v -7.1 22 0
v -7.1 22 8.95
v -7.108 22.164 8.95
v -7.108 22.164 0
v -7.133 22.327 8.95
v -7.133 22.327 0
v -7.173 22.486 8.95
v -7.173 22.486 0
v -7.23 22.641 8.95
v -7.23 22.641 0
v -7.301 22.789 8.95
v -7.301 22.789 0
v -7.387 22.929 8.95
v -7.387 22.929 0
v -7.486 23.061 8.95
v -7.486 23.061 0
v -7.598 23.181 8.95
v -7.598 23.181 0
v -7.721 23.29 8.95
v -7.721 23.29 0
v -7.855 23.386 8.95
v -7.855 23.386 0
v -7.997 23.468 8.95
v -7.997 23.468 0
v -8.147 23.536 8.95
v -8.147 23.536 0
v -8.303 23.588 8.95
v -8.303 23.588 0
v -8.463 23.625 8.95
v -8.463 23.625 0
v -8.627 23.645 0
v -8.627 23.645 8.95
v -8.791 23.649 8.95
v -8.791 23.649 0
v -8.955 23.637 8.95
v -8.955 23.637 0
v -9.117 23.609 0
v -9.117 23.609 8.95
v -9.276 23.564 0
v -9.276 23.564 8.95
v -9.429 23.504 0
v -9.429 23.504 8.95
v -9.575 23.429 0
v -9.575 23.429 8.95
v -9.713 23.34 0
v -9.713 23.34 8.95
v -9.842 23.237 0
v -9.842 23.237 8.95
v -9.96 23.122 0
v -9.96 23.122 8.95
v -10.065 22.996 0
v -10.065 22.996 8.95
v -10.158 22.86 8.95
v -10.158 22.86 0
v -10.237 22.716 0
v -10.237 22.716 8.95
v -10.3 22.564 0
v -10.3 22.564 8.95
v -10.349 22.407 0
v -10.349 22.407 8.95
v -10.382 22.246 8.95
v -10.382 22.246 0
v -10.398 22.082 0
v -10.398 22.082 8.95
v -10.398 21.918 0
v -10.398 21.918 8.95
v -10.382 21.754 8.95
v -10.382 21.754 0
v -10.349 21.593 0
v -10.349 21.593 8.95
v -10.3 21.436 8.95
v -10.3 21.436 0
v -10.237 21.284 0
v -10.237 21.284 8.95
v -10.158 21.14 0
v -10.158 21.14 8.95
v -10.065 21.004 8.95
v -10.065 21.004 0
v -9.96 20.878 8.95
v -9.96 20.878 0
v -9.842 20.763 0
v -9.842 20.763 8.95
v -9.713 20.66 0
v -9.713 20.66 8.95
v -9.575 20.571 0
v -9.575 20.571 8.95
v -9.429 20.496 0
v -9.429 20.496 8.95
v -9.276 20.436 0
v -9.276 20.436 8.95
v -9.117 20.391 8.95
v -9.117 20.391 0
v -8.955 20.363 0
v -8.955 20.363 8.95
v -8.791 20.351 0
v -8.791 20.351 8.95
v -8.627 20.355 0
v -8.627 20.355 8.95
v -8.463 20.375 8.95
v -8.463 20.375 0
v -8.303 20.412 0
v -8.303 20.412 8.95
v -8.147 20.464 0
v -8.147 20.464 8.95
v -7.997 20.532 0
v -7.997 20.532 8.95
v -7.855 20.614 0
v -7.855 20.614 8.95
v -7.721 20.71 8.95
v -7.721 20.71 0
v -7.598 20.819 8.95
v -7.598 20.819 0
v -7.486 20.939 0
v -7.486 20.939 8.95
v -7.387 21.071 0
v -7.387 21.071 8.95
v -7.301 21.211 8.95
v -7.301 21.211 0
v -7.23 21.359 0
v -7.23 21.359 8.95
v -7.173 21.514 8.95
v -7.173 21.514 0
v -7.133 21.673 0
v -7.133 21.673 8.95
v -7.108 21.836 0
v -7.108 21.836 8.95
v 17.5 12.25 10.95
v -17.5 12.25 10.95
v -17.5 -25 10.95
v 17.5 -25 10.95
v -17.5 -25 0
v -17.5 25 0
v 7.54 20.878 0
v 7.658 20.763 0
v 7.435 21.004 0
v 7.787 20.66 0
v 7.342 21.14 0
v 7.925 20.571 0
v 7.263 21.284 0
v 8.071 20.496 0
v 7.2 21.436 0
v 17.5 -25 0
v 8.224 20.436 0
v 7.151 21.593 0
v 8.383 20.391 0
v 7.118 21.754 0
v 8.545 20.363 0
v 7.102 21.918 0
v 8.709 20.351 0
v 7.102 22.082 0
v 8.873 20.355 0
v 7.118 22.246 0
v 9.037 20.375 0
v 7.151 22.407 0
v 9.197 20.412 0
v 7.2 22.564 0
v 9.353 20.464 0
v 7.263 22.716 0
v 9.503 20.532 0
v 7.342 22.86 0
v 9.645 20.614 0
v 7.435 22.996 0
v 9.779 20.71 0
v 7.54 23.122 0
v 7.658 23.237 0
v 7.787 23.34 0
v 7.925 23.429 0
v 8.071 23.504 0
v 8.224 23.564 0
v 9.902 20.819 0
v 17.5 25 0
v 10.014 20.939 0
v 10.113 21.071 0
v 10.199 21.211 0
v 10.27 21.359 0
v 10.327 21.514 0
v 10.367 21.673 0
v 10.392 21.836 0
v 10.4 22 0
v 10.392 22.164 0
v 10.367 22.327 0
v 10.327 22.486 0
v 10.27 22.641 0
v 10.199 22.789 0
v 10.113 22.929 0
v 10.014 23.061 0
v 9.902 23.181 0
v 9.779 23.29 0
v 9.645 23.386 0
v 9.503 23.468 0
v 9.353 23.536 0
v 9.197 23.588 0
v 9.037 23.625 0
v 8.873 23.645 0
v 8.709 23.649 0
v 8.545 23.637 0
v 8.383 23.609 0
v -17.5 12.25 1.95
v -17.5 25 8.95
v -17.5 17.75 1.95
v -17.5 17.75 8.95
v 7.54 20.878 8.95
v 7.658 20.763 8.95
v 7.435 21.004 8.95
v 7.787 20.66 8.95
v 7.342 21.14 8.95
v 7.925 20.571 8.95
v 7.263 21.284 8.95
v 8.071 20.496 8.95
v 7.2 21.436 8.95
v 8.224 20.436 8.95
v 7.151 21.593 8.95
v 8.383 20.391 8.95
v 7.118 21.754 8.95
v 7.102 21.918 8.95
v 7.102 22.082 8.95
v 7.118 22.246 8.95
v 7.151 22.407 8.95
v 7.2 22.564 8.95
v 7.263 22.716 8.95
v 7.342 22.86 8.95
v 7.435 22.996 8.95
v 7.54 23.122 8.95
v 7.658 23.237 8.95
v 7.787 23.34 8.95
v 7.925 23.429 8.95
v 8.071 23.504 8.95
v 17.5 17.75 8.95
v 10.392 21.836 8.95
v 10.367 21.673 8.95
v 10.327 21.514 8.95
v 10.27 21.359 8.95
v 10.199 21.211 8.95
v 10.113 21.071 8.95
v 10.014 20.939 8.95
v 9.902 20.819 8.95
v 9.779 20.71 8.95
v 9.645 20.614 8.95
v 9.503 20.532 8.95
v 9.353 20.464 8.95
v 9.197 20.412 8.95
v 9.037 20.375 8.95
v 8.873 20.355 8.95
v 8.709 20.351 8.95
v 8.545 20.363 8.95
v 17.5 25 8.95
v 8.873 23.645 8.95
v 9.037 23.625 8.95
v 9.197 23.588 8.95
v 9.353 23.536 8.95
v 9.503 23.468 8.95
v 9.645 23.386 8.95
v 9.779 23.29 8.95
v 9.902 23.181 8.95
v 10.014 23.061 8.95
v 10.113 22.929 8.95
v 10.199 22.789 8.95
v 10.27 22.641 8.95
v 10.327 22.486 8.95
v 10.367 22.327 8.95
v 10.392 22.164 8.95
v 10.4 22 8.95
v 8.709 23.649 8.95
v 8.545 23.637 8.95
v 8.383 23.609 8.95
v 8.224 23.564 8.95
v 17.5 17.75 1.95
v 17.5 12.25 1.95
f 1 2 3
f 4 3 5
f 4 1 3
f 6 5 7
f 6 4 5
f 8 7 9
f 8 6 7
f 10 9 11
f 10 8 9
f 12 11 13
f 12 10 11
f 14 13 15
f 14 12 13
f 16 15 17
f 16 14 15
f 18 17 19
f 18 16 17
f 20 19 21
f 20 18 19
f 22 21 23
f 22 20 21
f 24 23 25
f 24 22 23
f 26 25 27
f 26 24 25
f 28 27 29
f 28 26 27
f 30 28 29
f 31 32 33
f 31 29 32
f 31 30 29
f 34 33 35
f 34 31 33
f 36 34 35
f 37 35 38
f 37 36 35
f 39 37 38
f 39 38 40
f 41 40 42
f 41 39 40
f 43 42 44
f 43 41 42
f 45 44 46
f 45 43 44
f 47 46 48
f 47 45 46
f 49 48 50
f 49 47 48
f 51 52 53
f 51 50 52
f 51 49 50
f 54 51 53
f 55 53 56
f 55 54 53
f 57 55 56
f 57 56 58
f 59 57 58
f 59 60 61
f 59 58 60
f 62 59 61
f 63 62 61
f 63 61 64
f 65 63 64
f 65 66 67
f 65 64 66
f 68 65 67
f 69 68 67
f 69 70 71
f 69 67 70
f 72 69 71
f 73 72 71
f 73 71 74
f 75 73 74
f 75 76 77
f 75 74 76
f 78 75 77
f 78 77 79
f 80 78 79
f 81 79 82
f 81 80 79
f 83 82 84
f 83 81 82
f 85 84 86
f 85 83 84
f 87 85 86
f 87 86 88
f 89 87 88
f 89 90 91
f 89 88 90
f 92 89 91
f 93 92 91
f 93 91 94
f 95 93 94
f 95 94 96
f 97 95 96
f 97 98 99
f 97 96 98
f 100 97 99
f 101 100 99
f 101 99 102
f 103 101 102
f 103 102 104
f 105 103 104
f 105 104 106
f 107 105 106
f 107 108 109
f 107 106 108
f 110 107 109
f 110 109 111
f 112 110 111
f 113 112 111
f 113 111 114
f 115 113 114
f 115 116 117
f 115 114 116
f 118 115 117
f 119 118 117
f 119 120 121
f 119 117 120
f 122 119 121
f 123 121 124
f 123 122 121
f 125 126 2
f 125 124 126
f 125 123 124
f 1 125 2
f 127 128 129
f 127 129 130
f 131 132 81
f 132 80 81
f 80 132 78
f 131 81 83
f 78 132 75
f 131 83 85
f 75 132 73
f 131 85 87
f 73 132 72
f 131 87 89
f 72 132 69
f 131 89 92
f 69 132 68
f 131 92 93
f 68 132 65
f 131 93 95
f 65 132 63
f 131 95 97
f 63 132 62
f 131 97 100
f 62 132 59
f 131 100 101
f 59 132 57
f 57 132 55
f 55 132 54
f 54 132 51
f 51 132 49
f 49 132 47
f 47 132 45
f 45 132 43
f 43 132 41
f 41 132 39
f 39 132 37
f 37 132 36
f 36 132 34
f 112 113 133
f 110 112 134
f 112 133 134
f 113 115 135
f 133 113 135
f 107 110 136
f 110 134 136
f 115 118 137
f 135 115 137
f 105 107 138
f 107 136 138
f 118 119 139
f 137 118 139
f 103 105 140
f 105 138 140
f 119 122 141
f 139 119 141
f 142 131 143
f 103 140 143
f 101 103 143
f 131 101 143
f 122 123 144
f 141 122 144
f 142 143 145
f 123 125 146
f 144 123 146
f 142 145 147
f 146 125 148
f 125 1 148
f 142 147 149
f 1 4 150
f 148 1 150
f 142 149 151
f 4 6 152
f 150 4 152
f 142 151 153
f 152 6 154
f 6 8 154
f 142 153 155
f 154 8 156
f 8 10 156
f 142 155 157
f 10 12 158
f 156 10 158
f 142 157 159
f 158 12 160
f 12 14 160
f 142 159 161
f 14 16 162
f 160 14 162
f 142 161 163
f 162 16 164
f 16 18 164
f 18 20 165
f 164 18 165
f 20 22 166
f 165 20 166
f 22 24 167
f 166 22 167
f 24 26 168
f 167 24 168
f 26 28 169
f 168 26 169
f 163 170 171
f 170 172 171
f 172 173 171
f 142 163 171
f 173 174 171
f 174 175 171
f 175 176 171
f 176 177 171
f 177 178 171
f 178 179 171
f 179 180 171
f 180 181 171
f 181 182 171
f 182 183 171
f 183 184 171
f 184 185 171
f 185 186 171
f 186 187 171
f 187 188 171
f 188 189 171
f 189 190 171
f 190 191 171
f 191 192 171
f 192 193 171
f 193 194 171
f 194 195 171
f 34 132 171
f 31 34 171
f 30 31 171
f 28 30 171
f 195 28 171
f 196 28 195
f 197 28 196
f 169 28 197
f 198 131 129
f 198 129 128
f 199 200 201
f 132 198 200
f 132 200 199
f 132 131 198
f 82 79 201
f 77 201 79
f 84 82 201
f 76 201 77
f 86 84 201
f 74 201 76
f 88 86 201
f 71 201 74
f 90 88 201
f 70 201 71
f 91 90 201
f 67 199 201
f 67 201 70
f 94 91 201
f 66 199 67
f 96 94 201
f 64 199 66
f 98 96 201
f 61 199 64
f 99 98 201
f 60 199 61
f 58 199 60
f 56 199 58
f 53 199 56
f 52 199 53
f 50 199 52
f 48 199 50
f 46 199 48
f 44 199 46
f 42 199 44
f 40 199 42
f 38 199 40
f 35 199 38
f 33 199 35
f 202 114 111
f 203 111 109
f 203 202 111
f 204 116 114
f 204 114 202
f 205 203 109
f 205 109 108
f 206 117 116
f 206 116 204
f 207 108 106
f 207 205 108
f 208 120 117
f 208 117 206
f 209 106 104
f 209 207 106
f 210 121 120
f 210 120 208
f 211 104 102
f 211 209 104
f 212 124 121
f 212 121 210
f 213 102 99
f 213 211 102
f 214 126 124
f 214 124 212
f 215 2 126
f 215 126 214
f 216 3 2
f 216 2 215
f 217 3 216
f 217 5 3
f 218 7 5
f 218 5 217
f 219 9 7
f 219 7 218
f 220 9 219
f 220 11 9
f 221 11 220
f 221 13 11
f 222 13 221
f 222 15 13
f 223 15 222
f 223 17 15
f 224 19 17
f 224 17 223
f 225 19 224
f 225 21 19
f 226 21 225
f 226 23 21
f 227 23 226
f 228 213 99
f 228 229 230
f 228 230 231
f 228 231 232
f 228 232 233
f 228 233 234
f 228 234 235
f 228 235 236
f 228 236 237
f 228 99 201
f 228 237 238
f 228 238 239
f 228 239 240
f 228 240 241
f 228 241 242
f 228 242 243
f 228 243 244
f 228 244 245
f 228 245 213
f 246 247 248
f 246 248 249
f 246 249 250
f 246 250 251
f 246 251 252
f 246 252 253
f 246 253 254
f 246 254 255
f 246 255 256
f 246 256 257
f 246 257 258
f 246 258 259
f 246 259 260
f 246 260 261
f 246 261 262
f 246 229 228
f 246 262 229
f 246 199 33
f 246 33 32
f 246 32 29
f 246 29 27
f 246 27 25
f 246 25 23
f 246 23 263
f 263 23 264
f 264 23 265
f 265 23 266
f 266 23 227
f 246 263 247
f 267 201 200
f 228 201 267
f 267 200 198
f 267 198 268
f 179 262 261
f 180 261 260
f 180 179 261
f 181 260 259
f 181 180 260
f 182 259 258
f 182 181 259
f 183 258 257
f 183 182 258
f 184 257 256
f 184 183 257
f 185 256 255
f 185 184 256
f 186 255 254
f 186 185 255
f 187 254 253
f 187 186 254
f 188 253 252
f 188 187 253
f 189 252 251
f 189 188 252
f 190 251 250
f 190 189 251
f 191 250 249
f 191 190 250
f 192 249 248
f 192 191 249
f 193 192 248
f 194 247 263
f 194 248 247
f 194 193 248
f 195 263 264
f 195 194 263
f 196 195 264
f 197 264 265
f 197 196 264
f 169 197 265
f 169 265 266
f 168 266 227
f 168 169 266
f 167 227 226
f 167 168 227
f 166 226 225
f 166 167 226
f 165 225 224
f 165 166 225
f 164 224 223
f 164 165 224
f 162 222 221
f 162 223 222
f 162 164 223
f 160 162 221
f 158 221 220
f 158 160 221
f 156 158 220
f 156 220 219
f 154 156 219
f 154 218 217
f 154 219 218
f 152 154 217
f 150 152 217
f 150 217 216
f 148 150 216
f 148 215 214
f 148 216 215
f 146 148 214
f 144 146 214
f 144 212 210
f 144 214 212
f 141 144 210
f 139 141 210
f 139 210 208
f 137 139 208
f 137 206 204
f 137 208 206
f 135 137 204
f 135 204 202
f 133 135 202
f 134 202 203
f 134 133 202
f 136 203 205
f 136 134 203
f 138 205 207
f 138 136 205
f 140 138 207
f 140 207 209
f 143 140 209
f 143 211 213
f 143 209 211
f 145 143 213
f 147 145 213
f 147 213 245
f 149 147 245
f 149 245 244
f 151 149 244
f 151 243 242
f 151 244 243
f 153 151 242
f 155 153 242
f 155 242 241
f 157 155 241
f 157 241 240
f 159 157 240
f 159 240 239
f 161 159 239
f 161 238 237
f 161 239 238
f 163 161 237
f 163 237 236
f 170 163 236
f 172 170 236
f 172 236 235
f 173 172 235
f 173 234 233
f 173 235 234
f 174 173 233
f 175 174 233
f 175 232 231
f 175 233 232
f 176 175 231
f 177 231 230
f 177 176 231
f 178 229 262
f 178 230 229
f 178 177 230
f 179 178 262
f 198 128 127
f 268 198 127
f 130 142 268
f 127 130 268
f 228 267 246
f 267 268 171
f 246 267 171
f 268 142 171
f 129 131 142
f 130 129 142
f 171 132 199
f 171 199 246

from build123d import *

# Parameters (mm, degrees)
SKIZZE1_W                       = 35
SKIZZE1_H                       = 50
SKIZZE1_R                       = 1.65
AUFSATZ_LINEAR_AUSTRAGEN1_DEPTH = 10.95
SKIZZE2_W                       = 50
SKIZZE2_H                       = 5.5
SCHNITT_LINEAR_AUSTRAGEN1_DEPTH = 9
SKIZZE3_W                       = 35
SKIZZE3_H                       = 7.25
SCHNITT_LINEAR_AUSTRAGEN2_DEPTH = 2


with BuildPart() as part:
    # Skizze1 → Aufsatz-Linear austragen1 (new body)
    with BuildSketch(Plane.XY):
        Rectangle(SKIZZE1_W, SKIZZE1_H)
        with Locations((-8.75, 22)):
            Circle(SKIZZE1_R, mode=Mode.SUBTRACT)
        with Locations((8.75, 22)):
            Circle(SKIZZE1_R, mode=Mode.SUBTRACT)
    extrude(amount=AUFSATZ_LINEAR_AUSTRAGEN1_DEPTH)

    # Skizze2 → Schnitt-Linear austragen1 (cut)
    with BuildSketch(Plane.XY.offset(10.95)):
        with Locations((0, 15)):
            Rectangle(SKIZZE2_W, SKIZZE2_H)
    extrude(amount=-SCHNITT_LINEAR_AUSTRAGEN1_DEPTH, mode=Mode.SUBTRACT)

    # Skizze3 → Schnitt-Linear austragen2 (cut)
    with BuildSketch(Plane.XY.offset(10.95)):
        with Locations((0, 21.375)):
            Rectangle(SKIZZE3_W, SKIZZE3_H)
    extrude(amount=-SCHNITT_LINEAR_AUSTRAGEN2_DEPTH, mode=Mode.SUBTRACT)


solid = part.part
